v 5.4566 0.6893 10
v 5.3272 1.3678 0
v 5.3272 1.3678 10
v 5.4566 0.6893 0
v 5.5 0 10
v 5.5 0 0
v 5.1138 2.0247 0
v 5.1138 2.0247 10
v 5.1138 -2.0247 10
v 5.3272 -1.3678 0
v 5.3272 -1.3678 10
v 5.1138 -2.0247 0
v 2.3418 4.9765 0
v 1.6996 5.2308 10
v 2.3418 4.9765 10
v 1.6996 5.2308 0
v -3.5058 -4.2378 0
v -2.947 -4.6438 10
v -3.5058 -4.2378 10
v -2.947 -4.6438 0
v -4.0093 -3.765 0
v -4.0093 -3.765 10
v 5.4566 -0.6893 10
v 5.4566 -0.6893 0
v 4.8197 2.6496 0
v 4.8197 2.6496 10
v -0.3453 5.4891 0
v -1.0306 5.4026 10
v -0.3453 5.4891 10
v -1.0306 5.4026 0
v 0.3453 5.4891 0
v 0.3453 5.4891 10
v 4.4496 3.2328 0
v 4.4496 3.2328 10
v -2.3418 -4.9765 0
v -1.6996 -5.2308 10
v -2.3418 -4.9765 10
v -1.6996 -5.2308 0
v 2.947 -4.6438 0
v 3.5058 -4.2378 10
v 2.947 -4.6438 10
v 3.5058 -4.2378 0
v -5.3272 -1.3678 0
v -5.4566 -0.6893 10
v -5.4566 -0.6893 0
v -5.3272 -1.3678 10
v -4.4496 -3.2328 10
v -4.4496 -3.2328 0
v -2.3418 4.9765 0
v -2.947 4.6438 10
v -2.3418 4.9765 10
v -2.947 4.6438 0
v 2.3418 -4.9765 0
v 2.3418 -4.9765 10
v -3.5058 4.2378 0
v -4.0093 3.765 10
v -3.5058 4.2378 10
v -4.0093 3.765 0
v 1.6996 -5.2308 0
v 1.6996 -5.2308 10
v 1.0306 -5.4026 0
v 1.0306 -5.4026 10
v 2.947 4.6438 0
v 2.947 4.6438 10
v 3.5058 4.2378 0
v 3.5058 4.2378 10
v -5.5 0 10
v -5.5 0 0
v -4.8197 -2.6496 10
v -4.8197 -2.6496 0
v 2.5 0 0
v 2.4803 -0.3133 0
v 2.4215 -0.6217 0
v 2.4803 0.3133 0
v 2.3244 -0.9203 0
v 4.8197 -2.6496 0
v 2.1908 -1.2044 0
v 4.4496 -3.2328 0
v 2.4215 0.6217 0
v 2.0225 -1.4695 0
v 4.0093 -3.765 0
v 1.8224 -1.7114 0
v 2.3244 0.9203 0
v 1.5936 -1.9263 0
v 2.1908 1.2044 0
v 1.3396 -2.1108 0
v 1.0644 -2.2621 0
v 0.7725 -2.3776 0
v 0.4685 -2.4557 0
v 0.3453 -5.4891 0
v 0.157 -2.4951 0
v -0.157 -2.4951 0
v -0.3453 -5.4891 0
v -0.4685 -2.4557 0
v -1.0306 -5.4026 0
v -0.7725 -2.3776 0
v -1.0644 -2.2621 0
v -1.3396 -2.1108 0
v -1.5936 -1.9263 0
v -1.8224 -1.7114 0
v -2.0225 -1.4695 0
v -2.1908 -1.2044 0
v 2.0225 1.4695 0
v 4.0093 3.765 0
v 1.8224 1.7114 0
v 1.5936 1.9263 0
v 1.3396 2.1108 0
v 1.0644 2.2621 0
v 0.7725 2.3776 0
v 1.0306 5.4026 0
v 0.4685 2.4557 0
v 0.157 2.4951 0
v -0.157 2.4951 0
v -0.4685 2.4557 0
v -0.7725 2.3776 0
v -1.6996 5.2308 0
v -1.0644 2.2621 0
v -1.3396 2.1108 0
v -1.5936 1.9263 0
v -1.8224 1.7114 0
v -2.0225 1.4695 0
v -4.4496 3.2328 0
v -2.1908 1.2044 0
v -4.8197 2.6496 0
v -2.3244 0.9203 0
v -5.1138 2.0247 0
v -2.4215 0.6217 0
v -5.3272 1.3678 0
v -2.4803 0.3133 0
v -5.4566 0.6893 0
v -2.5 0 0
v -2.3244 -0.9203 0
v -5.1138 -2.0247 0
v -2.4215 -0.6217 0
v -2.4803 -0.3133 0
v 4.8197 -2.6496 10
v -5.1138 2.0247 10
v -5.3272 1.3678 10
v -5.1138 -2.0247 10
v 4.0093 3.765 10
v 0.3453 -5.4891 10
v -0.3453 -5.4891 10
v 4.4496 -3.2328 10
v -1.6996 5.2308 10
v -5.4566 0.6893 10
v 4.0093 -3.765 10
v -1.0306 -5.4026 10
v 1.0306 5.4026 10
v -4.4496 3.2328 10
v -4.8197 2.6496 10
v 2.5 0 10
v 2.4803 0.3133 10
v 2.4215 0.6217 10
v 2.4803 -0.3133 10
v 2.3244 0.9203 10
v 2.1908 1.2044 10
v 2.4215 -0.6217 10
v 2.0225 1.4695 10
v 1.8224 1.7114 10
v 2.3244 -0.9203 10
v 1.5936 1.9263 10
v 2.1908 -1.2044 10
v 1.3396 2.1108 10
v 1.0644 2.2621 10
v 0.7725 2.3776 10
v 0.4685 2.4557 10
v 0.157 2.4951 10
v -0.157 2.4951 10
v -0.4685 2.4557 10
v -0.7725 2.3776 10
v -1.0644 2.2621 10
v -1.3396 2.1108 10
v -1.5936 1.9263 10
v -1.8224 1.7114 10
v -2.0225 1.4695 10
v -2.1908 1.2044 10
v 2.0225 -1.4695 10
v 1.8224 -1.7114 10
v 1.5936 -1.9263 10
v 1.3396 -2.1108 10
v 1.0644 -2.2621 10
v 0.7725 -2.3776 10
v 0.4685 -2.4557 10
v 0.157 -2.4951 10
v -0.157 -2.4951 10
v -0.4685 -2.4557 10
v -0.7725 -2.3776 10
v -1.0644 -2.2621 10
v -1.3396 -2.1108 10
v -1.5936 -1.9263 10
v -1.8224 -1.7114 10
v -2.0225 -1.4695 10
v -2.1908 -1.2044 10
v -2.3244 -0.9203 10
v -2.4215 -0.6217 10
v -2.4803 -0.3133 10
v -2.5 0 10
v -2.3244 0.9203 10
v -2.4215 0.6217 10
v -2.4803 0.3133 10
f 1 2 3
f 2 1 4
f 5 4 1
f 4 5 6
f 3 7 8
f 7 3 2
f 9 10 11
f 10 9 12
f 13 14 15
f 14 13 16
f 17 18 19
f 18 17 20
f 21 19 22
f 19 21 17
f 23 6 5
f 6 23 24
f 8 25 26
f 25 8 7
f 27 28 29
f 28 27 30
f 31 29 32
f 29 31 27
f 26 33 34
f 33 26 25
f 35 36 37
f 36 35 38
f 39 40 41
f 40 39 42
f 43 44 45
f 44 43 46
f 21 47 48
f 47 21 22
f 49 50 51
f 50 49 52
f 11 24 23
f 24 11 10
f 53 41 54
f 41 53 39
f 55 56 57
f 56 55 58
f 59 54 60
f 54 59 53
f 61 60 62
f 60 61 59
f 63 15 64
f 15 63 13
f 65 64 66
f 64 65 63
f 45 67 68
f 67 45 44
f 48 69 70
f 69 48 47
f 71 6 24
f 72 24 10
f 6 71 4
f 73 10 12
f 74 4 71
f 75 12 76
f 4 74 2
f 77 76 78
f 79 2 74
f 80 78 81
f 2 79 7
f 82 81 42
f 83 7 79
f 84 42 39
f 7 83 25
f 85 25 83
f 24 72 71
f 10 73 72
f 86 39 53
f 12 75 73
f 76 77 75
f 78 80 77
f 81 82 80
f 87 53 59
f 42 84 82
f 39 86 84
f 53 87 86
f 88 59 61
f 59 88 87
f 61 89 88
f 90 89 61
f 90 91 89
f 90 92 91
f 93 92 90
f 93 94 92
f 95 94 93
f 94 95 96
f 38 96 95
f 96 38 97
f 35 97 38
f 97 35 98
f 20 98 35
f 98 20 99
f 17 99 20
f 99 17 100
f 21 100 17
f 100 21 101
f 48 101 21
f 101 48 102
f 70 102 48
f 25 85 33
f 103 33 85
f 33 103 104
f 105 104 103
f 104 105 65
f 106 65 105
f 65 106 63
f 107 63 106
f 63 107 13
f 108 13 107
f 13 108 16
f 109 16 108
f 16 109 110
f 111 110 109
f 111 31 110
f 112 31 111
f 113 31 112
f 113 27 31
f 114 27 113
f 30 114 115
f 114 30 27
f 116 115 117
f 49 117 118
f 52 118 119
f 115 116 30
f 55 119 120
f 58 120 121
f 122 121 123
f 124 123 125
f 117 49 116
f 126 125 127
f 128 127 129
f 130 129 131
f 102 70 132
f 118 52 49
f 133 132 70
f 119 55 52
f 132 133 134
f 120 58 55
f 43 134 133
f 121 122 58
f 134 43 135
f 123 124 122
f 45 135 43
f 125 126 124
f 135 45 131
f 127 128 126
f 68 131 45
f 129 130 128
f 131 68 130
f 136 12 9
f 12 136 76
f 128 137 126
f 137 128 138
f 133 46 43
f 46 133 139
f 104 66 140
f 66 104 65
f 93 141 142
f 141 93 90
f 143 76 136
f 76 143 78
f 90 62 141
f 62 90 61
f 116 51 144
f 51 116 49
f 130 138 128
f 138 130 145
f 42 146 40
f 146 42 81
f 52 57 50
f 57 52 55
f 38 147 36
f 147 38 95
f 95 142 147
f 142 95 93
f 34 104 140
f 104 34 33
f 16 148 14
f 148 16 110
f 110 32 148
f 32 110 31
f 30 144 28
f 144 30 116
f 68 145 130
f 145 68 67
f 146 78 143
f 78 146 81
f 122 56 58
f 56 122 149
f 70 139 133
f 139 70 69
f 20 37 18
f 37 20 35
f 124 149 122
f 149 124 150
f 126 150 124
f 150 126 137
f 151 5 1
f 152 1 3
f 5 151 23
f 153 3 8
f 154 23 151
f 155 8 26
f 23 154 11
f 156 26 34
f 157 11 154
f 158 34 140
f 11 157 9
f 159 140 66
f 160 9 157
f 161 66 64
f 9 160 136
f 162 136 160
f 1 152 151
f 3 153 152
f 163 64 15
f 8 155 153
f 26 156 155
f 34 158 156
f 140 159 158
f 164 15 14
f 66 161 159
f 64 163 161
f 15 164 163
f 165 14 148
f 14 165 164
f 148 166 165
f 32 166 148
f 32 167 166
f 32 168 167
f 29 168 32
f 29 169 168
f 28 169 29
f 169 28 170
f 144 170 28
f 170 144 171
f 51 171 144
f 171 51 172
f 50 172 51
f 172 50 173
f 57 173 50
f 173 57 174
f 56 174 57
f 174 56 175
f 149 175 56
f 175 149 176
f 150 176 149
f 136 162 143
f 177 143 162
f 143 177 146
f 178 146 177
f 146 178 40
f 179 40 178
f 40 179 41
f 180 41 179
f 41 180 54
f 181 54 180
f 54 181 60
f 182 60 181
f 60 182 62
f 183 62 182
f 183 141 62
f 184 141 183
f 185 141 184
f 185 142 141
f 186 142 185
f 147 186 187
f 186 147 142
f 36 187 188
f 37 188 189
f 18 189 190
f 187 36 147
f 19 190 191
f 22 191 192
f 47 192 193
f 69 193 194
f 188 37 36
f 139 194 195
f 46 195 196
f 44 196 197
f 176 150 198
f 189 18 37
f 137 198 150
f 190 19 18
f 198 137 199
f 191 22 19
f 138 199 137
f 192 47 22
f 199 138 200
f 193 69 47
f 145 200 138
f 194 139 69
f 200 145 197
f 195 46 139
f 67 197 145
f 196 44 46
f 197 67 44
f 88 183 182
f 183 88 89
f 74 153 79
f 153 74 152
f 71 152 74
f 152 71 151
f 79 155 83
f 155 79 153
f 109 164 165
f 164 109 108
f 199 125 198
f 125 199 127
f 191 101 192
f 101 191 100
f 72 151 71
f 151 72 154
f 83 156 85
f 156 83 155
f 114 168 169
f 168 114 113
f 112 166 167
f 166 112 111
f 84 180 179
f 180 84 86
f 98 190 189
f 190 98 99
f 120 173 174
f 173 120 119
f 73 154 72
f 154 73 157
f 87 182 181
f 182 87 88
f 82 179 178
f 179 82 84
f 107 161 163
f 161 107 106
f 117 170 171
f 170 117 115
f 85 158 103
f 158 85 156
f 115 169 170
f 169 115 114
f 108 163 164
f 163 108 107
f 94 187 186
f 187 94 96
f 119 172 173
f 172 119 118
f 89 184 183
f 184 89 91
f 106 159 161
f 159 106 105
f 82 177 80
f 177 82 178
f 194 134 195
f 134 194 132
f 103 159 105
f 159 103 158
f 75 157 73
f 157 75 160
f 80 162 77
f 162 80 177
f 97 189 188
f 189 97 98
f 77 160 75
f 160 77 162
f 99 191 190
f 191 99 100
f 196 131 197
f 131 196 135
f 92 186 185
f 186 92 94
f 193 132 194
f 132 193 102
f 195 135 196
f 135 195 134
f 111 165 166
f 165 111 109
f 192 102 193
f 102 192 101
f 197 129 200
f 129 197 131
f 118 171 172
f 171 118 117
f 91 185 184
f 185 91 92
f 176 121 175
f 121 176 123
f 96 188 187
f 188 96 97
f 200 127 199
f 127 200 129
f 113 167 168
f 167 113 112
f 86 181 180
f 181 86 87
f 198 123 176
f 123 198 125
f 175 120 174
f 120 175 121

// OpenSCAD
// file: hollow_cylinder.scad
// Provides a pipe (a hollow cylinder) lengthwise over Z
//
// 2 and only 2 of the following parameters must be set, or the module will
// assert:
// - external_diameter
// - internal_diameter
// - wall_thickness
//
// The origin of this object is at the center on both X and Y, and at the bottom
// in Z
module HollowCylinder(
  length,
  external_diameter=-1,
  internal_diameter=-1,
  wall_thickness=-1
) {
  assert(
    external_diameter == -1 ||
      internal_diameter == -1 ||
      wall_thickness == -1,
    str(
      "Only 2 of the 3 parameters (external_diameter, internal_diameter, ",
      "wall_thickness) can be used at once"));
  if (external_diameter == -1) {
    assert(
      internal_diameter >= 0 && wall_thickness >= 0,
      str(
        "2 of the 3 parameters (external_diameter, internal_diameter, ",
        "wall_thickness) need to be set"));
  } else if (internal_diameter == -1) {
    assert(
      external_diameter >= 0 && wall_thickness >= 0,
      str(
        "2 of the 3 parameters (external_diameter, internal_diameter, ",
        "wall_thickness) need to be set"));
  }

  id = internal_diameter == -1?
    external_diameter - 2 * wall_thickness:
    internal_diameter;
  ed = external_diameter == -1?
    internal_diameter + 2 * wall_thickness:
    external_diameter;
  difference() {
    cylinder(h=length, d=ed, center=false);
    translate([0,0,-1]) cylinder(h=length+2, d=id, center=false);
  }
}
// main file
use <hollow_cylinder.scad>

$fn=50;
// HollowCylinder(length=10,external_diameter=3,internal_diameter=1); // testdata/hollow_cylinder/ed_id.stl
// HollowCylinder(length=10,external_diameter=3,wall_thickness=0.2); // testdata/hollow_cylinder/ed_wt.stl
HollowCylinder(length=10,internal_diameter=5,wall_thickness=3); // testdata/hollow_cylinder/id_wt.stl
